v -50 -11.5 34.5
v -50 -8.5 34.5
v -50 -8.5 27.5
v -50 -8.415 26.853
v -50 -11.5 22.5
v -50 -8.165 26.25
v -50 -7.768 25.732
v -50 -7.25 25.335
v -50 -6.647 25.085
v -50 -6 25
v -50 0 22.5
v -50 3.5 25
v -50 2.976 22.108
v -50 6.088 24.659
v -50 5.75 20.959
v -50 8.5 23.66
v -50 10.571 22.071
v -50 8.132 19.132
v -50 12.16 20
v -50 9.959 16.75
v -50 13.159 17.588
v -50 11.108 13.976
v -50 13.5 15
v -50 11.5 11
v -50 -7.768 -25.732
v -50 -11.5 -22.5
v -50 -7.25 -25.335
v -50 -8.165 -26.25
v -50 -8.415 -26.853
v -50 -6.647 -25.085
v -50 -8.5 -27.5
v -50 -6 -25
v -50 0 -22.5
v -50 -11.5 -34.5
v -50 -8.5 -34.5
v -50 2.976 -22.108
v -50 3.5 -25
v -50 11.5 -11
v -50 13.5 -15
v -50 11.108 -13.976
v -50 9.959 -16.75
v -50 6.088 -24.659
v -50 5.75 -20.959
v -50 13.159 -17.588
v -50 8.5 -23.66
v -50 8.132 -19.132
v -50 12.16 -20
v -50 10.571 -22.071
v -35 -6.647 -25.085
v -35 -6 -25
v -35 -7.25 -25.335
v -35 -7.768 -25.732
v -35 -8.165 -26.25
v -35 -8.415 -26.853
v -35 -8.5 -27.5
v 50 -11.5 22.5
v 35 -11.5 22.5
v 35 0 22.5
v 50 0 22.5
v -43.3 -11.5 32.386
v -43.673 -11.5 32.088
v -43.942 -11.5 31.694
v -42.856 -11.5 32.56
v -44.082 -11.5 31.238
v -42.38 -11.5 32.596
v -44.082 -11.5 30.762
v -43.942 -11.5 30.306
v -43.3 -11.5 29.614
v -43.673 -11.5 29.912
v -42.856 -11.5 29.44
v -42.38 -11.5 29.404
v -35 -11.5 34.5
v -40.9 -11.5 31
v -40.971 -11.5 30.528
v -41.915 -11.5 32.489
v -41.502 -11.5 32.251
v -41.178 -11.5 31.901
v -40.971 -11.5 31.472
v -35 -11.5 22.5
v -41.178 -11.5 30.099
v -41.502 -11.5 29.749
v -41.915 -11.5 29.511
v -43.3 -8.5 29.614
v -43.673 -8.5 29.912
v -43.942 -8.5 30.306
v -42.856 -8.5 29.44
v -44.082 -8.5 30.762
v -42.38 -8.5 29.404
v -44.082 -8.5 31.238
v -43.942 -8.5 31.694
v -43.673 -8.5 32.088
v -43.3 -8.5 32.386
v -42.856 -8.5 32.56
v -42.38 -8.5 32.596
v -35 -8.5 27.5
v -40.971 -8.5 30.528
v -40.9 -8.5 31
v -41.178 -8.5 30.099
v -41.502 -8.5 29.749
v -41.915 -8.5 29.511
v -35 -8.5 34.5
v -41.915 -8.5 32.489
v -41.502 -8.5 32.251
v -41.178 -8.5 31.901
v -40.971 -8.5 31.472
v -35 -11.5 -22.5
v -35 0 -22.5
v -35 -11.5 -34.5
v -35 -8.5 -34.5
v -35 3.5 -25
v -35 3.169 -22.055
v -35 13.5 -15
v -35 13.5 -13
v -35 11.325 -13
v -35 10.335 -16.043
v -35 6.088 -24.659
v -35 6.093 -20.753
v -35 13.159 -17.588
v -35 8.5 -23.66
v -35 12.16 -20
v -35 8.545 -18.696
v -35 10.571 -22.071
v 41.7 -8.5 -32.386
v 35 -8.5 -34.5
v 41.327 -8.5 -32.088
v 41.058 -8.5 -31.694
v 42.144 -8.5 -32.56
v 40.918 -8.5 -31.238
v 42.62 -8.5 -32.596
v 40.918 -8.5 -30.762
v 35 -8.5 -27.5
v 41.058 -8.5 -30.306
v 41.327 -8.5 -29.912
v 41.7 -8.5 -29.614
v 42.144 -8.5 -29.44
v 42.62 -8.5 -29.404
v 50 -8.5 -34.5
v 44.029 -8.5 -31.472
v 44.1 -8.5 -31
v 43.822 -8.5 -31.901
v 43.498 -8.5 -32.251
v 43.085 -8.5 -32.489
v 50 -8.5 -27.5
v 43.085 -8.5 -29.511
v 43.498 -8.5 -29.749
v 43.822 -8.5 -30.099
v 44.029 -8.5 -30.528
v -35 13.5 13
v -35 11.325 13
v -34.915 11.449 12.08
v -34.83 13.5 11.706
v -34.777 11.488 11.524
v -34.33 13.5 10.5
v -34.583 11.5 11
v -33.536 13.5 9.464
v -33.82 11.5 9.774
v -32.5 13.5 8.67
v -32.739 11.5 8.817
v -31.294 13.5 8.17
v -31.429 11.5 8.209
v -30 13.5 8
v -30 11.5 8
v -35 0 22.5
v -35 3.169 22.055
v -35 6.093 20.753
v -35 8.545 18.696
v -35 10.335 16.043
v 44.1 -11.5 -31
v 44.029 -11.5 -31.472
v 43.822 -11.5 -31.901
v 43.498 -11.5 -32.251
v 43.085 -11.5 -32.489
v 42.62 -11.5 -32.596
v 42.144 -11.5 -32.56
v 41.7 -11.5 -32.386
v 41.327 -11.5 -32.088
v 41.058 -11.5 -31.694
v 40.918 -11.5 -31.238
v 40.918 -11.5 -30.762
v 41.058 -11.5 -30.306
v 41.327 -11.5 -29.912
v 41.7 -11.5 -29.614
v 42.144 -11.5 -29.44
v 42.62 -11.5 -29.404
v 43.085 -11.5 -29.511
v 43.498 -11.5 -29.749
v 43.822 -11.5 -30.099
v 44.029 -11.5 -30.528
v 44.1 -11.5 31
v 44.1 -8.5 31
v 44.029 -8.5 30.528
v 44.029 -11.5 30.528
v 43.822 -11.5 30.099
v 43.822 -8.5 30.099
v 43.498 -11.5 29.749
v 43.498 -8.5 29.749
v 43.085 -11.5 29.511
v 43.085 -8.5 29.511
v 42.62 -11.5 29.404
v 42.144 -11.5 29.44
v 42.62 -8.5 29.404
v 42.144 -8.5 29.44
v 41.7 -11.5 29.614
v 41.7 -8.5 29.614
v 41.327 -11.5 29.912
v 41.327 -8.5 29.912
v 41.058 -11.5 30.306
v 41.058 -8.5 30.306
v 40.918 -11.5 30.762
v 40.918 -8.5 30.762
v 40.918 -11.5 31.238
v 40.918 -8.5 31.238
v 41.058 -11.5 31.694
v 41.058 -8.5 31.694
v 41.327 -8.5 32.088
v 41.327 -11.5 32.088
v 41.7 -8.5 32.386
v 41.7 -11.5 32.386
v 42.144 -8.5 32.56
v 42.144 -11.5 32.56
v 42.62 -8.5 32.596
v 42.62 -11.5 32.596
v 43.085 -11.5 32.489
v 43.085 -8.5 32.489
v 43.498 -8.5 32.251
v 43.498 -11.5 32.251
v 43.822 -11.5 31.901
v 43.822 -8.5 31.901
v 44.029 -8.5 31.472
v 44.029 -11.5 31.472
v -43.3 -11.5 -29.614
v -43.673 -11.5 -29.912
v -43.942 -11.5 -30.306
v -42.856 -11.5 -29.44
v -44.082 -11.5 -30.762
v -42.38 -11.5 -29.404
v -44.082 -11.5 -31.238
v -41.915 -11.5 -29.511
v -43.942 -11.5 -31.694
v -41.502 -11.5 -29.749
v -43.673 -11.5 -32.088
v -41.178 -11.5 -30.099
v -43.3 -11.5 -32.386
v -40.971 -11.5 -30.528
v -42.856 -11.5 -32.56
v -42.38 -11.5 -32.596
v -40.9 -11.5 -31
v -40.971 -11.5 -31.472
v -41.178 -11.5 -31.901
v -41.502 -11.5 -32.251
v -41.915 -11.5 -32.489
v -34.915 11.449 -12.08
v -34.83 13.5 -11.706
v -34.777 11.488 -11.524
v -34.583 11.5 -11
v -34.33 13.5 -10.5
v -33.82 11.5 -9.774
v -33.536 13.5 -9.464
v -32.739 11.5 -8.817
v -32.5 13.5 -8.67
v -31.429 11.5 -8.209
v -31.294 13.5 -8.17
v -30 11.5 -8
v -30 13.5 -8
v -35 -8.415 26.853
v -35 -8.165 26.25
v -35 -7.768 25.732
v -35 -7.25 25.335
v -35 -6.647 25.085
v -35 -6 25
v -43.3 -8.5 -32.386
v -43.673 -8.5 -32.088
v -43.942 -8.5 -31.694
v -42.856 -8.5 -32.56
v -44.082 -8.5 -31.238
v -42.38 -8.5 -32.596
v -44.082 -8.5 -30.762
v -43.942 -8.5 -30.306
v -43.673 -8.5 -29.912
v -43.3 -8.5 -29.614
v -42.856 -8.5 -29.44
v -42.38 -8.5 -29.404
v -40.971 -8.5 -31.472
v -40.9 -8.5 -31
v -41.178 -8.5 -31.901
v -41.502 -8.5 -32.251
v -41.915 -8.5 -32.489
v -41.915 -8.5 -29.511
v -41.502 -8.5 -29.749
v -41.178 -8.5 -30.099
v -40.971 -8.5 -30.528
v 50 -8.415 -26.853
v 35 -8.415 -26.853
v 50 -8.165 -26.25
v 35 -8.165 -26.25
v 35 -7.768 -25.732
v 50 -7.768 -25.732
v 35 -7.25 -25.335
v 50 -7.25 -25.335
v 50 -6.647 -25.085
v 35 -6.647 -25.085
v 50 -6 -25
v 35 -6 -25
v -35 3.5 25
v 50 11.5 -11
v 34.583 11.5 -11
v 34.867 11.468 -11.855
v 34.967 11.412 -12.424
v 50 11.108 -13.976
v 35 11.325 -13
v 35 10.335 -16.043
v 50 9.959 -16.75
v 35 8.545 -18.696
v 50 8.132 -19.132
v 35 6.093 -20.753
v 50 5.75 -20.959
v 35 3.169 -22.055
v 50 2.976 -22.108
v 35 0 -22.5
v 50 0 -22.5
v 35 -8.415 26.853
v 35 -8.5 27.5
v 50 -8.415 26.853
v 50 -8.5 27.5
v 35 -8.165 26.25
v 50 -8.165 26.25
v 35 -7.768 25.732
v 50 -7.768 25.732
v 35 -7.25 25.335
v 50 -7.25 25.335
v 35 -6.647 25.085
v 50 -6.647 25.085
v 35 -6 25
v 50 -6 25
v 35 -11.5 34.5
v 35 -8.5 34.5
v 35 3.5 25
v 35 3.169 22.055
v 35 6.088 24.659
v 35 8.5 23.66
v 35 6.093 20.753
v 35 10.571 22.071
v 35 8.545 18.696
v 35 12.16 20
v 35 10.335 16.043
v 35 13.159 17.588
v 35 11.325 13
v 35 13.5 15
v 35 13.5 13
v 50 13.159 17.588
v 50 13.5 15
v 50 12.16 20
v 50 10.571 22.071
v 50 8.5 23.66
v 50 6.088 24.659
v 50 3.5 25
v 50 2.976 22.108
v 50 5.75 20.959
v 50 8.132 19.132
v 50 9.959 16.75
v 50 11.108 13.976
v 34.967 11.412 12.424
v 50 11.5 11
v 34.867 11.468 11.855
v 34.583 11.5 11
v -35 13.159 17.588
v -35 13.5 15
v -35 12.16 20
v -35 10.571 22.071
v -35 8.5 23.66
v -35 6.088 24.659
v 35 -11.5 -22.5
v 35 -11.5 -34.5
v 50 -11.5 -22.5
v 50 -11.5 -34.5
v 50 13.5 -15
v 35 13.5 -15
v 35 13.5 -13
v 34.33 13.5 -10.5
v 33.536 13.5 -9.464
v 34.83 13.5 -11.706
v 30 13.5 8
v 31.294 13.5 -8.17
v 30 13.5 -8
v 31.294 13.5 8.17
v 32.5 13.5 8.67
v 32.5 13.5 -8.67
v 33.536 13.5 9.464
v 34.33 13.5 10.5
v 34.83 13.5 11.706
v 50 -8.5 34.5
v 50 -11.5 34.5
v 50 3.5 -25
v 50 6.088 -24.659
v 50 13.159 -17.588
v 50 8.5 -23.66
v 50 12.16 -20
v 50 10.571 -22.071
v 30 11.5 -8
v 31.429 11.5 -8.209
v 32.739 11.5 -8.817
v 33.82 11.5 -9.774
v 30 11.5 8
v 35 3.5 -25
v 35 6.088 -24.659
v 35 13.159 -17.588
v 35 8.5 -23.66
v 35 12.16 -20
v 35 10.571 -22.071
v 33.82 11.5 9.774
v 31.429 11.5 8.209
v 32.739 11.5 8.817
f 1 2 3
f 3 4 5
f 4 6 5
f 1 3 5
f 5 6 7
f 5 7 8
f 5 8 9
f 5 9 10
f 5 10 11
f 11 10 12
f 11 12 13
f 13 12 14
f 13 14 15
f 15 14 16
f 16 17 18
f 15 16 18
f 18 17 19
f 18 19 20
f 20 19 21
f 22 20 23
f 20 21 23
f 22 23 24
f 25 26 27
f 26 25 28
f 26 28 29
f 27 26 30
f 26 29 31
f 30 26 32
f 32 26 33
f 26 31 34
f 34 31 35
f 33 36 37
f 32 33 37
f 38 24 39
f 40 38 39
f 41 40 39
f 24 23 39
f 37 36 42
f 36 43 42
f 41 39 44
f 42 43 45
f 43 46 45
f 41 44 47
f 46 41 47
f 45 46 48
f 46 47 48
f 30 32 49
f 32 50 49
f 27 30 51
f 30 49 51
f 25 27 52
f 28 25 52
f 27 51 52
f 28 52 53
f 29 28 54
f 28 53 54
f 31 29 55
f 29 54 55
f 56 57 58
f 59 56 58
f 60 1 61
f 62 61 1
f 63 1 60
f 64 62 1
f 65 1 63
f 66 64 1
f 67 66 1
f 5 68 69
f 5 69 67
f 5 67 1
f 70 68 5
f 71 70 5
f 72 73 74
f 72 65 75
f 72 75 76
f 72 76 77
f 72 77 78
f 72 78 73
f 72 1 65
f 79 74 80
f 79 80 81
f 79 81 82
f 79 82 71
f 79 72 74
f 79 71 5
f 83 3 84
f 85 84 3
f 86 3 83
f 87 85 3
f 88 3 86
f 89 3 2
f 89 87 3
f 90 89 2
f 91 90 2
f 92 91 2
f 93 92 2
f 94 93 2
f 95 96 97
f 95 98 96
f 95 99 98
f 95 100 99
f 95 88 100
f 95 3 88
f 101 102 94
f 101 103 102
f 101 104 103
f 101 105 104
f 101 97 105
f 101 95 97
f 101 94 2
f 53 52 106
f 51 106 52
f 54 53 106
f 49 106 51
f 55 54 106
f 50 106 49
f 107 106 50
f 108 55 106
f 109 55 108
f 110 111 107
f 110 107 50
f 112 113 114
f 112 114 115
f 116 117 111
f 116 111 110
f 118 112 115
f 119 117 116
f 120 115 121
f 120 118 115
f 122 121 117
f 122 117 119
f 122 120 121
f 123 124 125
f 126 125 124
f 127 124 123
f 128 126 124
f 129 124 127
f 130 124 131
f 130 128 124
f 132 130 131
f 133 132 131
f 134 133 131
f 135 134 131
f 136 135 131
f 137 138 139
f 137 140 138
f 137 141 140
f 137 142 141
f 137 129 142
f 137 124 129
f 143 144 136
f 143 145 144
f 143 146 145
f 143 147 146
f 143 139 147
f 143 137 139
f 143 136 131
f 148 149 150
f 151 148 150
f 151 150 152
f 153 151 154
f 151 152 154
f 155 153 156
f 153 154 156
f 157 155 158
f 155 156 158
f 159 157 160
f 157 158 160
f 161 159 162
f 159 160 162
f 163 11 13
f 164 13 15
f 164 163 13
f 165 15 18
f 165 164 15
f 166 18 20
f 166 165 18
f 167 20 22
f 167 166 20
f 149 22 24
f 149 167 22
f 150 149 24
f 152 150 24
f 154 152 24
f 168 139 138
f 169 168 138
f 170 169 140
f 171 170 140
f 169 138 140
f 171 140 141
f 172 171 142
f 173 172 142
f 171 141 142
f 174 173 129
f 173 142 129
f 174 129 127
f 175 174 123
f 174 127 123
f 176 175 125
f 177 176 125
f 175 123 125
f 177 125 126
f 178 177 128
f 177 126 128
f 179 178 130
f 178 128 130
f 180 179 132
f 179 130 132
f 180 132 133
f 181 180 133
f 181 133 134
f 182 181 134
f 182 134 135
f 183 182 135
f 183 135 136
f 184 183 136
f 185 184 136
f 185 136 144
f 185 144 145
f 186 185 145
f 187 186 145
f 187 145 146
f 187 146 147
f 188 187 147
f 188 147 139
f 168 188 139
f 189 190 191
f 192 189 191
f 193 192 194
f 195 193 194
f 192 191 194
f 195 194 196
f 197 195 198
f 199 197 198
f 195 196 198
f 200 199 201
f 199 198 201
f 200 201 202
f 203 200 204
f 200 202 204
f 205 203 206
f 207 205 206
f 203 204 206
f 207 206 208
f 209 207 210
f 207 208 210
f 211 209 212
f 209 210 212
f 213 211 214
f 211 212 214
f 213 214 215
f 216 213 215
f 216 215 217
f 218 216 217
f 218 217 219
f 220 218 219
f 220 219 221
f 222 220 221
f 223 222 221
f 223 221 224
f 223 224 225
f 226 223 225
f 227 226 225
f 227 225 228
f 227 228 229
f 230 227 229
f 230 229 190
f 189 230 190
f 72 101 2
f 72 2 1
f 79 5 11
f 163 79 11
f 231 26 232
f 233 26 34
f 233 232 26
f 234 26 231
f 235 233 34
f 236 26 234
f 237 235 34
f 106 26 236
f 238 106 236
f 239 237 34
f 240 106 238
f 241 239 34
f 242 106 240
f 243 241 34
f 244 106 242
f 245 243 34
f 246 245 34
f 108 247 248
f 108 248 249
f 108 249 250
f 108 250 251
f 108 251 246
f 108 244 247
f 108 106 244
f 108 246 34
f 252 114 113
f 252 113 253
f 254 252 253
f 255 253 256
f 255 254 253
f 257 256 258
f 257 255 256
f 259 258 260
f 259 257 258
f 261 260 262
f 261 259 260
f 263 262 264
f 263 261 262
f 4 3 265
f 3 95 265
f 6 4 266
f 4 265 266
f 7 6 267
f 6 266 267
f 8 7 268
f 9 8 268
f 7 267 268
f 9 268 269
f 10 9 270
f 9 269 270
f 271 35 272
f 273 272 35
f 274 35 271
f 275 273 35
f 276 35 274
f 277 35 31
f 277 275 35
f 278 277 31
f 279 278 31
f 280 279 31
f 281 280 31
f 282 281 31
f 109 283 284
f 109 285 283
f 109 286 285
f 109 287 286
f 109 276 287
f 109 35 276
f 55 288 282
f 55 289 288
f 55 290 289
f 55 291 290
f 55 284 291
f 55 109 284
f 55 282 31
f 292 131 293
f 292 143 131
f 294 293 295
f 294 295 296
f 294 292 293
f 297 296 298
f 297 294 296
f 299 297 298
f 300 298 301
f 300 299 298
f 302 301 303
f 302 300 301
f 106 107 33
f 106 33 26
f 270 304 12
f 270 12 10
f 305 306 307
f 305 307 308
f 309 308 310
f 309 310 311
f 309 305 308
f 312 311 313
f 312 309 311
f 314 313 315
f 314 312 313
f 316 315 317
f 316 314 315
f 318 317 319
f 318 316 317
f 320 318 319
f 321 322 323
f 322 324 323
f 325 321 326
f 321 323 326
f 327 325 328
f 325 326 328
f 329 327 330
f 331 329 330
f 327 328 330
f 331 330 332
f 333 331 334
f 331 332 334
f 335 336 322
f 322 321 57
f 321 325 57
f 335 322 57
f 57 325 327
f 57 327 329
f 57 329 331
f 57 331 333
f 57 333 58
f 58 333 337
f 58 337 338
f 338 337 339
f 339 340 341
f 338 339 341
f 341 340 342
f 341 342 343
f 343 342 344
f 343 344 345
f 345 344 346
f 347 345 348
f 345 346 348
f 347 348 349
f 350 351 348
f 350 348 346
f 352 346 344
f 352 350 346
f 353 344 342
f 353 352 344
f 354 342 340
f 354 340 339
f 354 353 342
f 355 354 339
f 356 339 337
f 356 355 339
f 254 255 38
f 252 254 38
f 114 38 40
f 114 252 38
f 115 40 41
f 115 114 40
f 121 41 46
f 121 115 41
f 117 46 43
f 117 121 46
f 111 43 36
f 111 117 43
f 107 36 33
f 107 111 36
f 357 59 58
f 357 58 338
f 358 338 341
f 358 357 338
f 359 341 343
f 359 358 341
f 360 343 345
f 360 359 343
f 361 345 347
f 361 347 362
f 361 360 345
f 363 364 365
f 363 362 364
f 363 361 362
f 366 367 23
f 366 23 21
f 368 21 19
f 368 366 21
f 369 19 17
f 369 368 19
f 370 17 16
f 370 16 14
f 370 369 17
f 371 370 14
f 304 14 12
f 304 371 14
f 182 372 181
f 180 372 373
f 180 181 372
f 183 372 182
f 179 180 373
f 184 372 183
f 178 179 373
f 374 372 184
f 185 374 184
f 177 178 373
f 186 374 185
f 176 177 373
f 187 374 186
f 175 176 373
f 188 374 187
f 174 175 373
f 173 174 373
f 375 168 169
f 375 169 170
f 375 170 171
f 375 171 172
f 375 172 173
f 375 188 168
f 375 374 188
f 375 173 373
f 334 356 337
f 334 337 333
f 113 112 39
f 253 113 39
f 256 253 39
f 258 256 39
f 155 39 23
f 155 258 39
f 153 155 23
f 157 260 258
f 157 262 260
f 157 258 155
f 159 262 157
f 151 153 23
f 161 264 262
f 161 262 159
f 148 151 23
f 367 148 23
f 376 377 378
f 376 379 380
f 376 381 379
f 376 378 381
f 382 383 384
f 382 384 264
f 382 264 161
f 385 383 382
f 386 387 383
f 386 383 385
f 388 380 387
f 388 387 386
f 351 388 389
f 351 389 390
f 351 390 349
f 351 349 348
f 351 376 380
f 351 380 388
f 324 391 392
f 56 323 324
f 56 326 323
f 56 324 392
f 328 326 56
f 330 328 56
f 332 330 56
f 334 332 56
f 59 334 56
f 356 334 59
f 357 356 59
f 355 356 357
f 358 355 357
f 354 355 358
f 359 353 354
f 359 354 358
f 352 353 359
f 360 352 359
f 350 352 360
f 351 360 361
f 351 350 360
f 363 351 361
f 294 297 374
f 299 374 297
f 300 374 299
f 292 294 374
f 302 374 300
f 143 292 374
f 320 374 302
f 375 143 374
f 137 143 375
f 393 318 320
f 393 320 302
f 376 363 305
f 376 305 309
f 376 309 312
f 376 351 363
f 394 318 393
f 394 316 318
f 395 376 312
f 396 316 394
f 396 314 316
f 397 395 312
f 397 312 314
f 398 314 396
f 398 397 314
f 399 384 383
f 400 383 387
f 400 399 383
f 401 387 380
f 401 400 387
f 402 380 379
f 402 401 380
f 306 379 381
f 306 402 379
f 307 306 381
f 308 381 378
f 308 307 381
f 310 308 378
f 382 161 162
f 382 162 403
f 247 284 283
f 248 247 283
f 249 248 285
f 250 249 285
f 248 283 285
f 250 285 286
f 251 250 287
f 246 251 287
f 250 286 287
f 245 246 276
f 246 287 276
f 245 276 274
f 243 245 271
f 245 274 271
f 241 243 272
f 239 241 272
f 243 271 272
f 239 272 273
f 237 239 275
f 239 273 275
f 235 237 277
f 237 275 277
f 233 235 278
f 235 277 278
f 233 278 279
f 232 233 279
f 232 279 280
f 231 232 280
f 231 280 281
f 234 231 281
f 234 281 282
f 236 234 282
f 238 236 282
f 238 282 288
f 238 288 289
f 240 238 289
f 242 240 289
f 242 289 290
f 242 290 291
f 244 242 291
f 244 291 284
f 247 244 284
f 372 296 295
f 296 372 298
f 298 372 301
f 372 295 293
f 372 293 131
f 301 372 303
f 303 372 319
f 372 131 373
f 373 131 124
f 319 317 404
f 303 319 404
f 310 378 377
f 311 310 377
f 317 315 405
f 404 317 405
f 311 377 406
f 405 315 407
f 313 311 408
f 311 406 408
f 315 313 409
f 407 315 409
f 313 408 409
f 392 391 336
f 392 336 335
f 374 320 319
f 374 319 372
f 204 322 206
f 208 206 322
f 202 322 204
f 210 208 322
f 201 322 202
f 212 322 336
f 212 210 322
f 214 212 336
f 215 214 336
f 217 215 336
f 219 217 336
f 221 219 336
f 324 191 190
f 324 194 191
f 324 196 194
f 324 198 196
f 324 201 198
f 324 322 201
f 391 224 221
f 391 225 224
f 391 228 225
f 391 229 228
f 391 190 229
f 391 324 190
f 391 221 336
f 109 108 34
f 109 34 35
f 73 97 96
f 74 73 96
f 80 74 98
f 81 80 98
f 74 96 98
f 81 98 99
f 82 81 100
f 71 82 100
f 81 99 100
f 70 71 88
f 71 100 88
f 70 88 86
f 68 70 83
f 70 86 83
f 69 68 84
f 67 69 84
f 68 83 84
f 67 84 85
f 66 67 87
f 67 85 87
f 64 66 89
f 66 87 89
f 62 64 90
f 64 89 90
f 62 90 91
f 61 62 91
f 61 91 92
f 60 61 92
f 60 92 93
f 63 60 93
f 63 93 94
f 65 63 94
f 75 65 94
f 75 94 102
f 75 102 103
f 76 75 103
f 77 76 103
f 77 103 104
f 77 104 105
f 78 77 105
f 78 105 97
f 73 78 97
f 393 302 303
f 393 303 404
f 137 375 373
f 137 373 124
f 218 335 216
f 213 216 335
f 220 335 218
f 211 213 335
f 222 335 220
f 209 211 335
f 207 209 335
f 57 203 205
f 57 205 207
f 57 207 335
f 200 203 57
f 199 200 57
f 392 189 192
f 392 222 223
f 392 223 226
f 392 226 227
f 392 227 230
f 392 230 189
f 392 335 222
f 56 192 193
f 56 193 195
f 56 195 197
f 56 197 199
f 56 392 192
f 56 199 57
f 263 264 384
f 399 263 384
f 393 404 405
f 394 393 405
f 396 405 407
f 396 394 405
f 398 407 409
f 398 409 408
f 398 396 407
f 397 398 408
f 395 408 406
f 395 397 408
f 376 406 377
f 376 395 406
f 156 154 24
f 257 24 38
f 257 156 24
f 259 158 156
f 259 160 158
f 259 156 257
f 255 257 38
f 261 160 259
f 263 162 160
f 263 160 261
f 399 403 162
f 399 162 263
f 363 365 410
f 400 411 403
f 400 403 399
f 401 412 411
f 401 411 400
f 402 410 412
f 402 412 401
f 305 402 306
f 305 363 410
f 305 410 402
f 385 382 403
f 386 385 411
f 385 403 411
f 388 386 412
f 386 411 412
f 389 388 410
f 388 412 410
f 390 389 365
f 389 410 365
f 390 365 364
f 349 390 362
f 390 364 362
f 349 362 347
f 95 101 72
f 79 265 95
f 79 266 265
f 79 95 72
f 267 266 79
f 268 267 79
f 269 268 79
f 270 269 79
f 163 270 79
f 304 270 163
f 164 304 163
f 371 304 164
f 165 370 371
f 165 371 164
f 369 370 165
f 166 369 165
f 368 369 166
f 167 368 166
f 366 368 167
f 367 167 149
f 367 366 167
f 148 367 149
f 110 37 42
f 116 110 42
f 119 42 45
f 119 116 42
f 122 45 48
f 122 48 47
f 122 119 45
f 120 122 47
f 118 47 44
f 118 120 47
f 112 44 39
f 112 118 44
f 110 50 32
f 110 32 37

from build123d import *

# Parameters (mm, degrees)
BOSS_EXTRUDE1_DEPTH     = 50
SKETCH2_W               = 70
SKETCH2_H               = 26.5
CUT_EXTRUDE1_DEPTH      = 1
CUT_EXTRUDE1_DEPTH_BACK = 26
FILLET1_R               = 2.5
FILLET2_R               = 5
SKETCH3_R               = 1.6
CUT_EXTRUDE2_DEPTH      = 23.0000001
CUT_EXTRUDE2_DEPTH_BACK = 4


with BuildPart() as part:
    # Sketch1 → Boss-Extrude1 (new body, symmetric)
    with BuildSketch(Plane(origin=(0, 0, 0), x_dir=(0, 0, -1), z_dir=(1, 0, 0))):
        with BuildLine():
            Line((-11, 11.5), (11, 11.5))
            ThreePointArc((11, 11.5), (19.131727984, 8.131727984), (22.5, 0))
            Line((22.5, 0), (22.5, -11.5))
            Line((22.5, -11.5), (34.5, -11.5))
            Line((34.5, -11.5), (34.5, -8.5))
            Line((34.5, -8.5), (25, -8.5))
            Line((25, -8.5), (25, 0))
            Line((25, 0), (25, 3.5))
            ThreePointArc((25, 3.5), (22.071067812, 10.571067812), (15, 13.5))
            Line((15, 13.5), (-15, 13.5))
            ThreePointArc((-15, 13.5), (-22.071067812, 10.571067812), (-25, 3.5))
            Line((-25, 3.5), (-25, 0))
            Line((-25, 0), (-25, -8.5))
            Line((-25, -8.5), (-34.5, -8.5))
            Line((-34.5, -8.5), (-34.5, -11.5))
            Line((-34.5, -11.5), (-22.5, -11.5))
            Line((-22.5, -11.5), (-22.5, 0))
            ThreePointArc((-22.5, 0), (-19.131727984, 8.131727984), (-11, 11.5))
        make_face()
    extrude(amount=BOSS_EXTRUDE1_DEPTH, both=True)

    # Sketch2 → Cut-Extrude1 (cut, two sides)
    with BuildSketch(Plane(origin=(0, 13.5, 0), x_dir=(1, 0, 0), z_dir=(0, 1, 0))) as cut_extrude1_sk:
        with Locations((0, 21.25)):
            Rectangle(SKETCH2_W, SKETCH2_H)
        with Locations((0, -21.25)):
            Rectangle(SKETCH2_W, SKETCH2_H)
    extrude(amount=CUT_EXTRUDE1_DEPTH, mode=Mode.SUBTRACT)
    extrude(cut_extrude1_sk.sketch, amount=-CUT_EXTRUDE1_DEPTH_BACK, mode=Mode.SUBTRACT)

    # Fillet1
    fillet1_edges = [part.edges().sort_by_distance(p)[0] for p in [
        (42.5, -8.5, 25),
        (42.5, -8.5, -25),
        (-42.5, -8.5, 25),
        (-42.5, -8.5, -25),
    ]]
    fillet(fillet1_edges, radius=FILLET1_R)

    # Fillet2
    fillet2_edges = [part.edges().sort_by_distance(p)[0] for p in [
        (35, 12.5, -8),
        (35, 12.5, 8),
        (-35, 12.5, 8),
        (-35, 12.5, -8),
    ]]
    fillet(fillet2_edges, radius=FILLET2_R)

    # Sketch3 → Cut-Extrude2 (cut, two sides)
    with BuildSketch(Plane(origin=(0, -8.5, 0), x_dir=(1, 0, 0), z_dir=(0, 1, 0))) as cut_extrude2_sk:
        with Locations((42.5, -31)):
            Circle(SKETCH3_R)
        with Locations((42.5, 31)):
            Circle(SKETCH3_R)
        with Locations((-42.5, 31)):
            Circle(SKETCH3_R)
        with Locations((-42.5, -31)):
            Circle(SKETCH3_R)
    extrude(amount=CUT_EXTRUDE2_DEPTH, mode=Mode.SUBTRACT)
    extrude(cut_extrude2_sk.sketch, amount=-CUT_EXTRUDE2_DEPTH_BACK, mode=Mode.SUBTRACT)


solid = part.part
